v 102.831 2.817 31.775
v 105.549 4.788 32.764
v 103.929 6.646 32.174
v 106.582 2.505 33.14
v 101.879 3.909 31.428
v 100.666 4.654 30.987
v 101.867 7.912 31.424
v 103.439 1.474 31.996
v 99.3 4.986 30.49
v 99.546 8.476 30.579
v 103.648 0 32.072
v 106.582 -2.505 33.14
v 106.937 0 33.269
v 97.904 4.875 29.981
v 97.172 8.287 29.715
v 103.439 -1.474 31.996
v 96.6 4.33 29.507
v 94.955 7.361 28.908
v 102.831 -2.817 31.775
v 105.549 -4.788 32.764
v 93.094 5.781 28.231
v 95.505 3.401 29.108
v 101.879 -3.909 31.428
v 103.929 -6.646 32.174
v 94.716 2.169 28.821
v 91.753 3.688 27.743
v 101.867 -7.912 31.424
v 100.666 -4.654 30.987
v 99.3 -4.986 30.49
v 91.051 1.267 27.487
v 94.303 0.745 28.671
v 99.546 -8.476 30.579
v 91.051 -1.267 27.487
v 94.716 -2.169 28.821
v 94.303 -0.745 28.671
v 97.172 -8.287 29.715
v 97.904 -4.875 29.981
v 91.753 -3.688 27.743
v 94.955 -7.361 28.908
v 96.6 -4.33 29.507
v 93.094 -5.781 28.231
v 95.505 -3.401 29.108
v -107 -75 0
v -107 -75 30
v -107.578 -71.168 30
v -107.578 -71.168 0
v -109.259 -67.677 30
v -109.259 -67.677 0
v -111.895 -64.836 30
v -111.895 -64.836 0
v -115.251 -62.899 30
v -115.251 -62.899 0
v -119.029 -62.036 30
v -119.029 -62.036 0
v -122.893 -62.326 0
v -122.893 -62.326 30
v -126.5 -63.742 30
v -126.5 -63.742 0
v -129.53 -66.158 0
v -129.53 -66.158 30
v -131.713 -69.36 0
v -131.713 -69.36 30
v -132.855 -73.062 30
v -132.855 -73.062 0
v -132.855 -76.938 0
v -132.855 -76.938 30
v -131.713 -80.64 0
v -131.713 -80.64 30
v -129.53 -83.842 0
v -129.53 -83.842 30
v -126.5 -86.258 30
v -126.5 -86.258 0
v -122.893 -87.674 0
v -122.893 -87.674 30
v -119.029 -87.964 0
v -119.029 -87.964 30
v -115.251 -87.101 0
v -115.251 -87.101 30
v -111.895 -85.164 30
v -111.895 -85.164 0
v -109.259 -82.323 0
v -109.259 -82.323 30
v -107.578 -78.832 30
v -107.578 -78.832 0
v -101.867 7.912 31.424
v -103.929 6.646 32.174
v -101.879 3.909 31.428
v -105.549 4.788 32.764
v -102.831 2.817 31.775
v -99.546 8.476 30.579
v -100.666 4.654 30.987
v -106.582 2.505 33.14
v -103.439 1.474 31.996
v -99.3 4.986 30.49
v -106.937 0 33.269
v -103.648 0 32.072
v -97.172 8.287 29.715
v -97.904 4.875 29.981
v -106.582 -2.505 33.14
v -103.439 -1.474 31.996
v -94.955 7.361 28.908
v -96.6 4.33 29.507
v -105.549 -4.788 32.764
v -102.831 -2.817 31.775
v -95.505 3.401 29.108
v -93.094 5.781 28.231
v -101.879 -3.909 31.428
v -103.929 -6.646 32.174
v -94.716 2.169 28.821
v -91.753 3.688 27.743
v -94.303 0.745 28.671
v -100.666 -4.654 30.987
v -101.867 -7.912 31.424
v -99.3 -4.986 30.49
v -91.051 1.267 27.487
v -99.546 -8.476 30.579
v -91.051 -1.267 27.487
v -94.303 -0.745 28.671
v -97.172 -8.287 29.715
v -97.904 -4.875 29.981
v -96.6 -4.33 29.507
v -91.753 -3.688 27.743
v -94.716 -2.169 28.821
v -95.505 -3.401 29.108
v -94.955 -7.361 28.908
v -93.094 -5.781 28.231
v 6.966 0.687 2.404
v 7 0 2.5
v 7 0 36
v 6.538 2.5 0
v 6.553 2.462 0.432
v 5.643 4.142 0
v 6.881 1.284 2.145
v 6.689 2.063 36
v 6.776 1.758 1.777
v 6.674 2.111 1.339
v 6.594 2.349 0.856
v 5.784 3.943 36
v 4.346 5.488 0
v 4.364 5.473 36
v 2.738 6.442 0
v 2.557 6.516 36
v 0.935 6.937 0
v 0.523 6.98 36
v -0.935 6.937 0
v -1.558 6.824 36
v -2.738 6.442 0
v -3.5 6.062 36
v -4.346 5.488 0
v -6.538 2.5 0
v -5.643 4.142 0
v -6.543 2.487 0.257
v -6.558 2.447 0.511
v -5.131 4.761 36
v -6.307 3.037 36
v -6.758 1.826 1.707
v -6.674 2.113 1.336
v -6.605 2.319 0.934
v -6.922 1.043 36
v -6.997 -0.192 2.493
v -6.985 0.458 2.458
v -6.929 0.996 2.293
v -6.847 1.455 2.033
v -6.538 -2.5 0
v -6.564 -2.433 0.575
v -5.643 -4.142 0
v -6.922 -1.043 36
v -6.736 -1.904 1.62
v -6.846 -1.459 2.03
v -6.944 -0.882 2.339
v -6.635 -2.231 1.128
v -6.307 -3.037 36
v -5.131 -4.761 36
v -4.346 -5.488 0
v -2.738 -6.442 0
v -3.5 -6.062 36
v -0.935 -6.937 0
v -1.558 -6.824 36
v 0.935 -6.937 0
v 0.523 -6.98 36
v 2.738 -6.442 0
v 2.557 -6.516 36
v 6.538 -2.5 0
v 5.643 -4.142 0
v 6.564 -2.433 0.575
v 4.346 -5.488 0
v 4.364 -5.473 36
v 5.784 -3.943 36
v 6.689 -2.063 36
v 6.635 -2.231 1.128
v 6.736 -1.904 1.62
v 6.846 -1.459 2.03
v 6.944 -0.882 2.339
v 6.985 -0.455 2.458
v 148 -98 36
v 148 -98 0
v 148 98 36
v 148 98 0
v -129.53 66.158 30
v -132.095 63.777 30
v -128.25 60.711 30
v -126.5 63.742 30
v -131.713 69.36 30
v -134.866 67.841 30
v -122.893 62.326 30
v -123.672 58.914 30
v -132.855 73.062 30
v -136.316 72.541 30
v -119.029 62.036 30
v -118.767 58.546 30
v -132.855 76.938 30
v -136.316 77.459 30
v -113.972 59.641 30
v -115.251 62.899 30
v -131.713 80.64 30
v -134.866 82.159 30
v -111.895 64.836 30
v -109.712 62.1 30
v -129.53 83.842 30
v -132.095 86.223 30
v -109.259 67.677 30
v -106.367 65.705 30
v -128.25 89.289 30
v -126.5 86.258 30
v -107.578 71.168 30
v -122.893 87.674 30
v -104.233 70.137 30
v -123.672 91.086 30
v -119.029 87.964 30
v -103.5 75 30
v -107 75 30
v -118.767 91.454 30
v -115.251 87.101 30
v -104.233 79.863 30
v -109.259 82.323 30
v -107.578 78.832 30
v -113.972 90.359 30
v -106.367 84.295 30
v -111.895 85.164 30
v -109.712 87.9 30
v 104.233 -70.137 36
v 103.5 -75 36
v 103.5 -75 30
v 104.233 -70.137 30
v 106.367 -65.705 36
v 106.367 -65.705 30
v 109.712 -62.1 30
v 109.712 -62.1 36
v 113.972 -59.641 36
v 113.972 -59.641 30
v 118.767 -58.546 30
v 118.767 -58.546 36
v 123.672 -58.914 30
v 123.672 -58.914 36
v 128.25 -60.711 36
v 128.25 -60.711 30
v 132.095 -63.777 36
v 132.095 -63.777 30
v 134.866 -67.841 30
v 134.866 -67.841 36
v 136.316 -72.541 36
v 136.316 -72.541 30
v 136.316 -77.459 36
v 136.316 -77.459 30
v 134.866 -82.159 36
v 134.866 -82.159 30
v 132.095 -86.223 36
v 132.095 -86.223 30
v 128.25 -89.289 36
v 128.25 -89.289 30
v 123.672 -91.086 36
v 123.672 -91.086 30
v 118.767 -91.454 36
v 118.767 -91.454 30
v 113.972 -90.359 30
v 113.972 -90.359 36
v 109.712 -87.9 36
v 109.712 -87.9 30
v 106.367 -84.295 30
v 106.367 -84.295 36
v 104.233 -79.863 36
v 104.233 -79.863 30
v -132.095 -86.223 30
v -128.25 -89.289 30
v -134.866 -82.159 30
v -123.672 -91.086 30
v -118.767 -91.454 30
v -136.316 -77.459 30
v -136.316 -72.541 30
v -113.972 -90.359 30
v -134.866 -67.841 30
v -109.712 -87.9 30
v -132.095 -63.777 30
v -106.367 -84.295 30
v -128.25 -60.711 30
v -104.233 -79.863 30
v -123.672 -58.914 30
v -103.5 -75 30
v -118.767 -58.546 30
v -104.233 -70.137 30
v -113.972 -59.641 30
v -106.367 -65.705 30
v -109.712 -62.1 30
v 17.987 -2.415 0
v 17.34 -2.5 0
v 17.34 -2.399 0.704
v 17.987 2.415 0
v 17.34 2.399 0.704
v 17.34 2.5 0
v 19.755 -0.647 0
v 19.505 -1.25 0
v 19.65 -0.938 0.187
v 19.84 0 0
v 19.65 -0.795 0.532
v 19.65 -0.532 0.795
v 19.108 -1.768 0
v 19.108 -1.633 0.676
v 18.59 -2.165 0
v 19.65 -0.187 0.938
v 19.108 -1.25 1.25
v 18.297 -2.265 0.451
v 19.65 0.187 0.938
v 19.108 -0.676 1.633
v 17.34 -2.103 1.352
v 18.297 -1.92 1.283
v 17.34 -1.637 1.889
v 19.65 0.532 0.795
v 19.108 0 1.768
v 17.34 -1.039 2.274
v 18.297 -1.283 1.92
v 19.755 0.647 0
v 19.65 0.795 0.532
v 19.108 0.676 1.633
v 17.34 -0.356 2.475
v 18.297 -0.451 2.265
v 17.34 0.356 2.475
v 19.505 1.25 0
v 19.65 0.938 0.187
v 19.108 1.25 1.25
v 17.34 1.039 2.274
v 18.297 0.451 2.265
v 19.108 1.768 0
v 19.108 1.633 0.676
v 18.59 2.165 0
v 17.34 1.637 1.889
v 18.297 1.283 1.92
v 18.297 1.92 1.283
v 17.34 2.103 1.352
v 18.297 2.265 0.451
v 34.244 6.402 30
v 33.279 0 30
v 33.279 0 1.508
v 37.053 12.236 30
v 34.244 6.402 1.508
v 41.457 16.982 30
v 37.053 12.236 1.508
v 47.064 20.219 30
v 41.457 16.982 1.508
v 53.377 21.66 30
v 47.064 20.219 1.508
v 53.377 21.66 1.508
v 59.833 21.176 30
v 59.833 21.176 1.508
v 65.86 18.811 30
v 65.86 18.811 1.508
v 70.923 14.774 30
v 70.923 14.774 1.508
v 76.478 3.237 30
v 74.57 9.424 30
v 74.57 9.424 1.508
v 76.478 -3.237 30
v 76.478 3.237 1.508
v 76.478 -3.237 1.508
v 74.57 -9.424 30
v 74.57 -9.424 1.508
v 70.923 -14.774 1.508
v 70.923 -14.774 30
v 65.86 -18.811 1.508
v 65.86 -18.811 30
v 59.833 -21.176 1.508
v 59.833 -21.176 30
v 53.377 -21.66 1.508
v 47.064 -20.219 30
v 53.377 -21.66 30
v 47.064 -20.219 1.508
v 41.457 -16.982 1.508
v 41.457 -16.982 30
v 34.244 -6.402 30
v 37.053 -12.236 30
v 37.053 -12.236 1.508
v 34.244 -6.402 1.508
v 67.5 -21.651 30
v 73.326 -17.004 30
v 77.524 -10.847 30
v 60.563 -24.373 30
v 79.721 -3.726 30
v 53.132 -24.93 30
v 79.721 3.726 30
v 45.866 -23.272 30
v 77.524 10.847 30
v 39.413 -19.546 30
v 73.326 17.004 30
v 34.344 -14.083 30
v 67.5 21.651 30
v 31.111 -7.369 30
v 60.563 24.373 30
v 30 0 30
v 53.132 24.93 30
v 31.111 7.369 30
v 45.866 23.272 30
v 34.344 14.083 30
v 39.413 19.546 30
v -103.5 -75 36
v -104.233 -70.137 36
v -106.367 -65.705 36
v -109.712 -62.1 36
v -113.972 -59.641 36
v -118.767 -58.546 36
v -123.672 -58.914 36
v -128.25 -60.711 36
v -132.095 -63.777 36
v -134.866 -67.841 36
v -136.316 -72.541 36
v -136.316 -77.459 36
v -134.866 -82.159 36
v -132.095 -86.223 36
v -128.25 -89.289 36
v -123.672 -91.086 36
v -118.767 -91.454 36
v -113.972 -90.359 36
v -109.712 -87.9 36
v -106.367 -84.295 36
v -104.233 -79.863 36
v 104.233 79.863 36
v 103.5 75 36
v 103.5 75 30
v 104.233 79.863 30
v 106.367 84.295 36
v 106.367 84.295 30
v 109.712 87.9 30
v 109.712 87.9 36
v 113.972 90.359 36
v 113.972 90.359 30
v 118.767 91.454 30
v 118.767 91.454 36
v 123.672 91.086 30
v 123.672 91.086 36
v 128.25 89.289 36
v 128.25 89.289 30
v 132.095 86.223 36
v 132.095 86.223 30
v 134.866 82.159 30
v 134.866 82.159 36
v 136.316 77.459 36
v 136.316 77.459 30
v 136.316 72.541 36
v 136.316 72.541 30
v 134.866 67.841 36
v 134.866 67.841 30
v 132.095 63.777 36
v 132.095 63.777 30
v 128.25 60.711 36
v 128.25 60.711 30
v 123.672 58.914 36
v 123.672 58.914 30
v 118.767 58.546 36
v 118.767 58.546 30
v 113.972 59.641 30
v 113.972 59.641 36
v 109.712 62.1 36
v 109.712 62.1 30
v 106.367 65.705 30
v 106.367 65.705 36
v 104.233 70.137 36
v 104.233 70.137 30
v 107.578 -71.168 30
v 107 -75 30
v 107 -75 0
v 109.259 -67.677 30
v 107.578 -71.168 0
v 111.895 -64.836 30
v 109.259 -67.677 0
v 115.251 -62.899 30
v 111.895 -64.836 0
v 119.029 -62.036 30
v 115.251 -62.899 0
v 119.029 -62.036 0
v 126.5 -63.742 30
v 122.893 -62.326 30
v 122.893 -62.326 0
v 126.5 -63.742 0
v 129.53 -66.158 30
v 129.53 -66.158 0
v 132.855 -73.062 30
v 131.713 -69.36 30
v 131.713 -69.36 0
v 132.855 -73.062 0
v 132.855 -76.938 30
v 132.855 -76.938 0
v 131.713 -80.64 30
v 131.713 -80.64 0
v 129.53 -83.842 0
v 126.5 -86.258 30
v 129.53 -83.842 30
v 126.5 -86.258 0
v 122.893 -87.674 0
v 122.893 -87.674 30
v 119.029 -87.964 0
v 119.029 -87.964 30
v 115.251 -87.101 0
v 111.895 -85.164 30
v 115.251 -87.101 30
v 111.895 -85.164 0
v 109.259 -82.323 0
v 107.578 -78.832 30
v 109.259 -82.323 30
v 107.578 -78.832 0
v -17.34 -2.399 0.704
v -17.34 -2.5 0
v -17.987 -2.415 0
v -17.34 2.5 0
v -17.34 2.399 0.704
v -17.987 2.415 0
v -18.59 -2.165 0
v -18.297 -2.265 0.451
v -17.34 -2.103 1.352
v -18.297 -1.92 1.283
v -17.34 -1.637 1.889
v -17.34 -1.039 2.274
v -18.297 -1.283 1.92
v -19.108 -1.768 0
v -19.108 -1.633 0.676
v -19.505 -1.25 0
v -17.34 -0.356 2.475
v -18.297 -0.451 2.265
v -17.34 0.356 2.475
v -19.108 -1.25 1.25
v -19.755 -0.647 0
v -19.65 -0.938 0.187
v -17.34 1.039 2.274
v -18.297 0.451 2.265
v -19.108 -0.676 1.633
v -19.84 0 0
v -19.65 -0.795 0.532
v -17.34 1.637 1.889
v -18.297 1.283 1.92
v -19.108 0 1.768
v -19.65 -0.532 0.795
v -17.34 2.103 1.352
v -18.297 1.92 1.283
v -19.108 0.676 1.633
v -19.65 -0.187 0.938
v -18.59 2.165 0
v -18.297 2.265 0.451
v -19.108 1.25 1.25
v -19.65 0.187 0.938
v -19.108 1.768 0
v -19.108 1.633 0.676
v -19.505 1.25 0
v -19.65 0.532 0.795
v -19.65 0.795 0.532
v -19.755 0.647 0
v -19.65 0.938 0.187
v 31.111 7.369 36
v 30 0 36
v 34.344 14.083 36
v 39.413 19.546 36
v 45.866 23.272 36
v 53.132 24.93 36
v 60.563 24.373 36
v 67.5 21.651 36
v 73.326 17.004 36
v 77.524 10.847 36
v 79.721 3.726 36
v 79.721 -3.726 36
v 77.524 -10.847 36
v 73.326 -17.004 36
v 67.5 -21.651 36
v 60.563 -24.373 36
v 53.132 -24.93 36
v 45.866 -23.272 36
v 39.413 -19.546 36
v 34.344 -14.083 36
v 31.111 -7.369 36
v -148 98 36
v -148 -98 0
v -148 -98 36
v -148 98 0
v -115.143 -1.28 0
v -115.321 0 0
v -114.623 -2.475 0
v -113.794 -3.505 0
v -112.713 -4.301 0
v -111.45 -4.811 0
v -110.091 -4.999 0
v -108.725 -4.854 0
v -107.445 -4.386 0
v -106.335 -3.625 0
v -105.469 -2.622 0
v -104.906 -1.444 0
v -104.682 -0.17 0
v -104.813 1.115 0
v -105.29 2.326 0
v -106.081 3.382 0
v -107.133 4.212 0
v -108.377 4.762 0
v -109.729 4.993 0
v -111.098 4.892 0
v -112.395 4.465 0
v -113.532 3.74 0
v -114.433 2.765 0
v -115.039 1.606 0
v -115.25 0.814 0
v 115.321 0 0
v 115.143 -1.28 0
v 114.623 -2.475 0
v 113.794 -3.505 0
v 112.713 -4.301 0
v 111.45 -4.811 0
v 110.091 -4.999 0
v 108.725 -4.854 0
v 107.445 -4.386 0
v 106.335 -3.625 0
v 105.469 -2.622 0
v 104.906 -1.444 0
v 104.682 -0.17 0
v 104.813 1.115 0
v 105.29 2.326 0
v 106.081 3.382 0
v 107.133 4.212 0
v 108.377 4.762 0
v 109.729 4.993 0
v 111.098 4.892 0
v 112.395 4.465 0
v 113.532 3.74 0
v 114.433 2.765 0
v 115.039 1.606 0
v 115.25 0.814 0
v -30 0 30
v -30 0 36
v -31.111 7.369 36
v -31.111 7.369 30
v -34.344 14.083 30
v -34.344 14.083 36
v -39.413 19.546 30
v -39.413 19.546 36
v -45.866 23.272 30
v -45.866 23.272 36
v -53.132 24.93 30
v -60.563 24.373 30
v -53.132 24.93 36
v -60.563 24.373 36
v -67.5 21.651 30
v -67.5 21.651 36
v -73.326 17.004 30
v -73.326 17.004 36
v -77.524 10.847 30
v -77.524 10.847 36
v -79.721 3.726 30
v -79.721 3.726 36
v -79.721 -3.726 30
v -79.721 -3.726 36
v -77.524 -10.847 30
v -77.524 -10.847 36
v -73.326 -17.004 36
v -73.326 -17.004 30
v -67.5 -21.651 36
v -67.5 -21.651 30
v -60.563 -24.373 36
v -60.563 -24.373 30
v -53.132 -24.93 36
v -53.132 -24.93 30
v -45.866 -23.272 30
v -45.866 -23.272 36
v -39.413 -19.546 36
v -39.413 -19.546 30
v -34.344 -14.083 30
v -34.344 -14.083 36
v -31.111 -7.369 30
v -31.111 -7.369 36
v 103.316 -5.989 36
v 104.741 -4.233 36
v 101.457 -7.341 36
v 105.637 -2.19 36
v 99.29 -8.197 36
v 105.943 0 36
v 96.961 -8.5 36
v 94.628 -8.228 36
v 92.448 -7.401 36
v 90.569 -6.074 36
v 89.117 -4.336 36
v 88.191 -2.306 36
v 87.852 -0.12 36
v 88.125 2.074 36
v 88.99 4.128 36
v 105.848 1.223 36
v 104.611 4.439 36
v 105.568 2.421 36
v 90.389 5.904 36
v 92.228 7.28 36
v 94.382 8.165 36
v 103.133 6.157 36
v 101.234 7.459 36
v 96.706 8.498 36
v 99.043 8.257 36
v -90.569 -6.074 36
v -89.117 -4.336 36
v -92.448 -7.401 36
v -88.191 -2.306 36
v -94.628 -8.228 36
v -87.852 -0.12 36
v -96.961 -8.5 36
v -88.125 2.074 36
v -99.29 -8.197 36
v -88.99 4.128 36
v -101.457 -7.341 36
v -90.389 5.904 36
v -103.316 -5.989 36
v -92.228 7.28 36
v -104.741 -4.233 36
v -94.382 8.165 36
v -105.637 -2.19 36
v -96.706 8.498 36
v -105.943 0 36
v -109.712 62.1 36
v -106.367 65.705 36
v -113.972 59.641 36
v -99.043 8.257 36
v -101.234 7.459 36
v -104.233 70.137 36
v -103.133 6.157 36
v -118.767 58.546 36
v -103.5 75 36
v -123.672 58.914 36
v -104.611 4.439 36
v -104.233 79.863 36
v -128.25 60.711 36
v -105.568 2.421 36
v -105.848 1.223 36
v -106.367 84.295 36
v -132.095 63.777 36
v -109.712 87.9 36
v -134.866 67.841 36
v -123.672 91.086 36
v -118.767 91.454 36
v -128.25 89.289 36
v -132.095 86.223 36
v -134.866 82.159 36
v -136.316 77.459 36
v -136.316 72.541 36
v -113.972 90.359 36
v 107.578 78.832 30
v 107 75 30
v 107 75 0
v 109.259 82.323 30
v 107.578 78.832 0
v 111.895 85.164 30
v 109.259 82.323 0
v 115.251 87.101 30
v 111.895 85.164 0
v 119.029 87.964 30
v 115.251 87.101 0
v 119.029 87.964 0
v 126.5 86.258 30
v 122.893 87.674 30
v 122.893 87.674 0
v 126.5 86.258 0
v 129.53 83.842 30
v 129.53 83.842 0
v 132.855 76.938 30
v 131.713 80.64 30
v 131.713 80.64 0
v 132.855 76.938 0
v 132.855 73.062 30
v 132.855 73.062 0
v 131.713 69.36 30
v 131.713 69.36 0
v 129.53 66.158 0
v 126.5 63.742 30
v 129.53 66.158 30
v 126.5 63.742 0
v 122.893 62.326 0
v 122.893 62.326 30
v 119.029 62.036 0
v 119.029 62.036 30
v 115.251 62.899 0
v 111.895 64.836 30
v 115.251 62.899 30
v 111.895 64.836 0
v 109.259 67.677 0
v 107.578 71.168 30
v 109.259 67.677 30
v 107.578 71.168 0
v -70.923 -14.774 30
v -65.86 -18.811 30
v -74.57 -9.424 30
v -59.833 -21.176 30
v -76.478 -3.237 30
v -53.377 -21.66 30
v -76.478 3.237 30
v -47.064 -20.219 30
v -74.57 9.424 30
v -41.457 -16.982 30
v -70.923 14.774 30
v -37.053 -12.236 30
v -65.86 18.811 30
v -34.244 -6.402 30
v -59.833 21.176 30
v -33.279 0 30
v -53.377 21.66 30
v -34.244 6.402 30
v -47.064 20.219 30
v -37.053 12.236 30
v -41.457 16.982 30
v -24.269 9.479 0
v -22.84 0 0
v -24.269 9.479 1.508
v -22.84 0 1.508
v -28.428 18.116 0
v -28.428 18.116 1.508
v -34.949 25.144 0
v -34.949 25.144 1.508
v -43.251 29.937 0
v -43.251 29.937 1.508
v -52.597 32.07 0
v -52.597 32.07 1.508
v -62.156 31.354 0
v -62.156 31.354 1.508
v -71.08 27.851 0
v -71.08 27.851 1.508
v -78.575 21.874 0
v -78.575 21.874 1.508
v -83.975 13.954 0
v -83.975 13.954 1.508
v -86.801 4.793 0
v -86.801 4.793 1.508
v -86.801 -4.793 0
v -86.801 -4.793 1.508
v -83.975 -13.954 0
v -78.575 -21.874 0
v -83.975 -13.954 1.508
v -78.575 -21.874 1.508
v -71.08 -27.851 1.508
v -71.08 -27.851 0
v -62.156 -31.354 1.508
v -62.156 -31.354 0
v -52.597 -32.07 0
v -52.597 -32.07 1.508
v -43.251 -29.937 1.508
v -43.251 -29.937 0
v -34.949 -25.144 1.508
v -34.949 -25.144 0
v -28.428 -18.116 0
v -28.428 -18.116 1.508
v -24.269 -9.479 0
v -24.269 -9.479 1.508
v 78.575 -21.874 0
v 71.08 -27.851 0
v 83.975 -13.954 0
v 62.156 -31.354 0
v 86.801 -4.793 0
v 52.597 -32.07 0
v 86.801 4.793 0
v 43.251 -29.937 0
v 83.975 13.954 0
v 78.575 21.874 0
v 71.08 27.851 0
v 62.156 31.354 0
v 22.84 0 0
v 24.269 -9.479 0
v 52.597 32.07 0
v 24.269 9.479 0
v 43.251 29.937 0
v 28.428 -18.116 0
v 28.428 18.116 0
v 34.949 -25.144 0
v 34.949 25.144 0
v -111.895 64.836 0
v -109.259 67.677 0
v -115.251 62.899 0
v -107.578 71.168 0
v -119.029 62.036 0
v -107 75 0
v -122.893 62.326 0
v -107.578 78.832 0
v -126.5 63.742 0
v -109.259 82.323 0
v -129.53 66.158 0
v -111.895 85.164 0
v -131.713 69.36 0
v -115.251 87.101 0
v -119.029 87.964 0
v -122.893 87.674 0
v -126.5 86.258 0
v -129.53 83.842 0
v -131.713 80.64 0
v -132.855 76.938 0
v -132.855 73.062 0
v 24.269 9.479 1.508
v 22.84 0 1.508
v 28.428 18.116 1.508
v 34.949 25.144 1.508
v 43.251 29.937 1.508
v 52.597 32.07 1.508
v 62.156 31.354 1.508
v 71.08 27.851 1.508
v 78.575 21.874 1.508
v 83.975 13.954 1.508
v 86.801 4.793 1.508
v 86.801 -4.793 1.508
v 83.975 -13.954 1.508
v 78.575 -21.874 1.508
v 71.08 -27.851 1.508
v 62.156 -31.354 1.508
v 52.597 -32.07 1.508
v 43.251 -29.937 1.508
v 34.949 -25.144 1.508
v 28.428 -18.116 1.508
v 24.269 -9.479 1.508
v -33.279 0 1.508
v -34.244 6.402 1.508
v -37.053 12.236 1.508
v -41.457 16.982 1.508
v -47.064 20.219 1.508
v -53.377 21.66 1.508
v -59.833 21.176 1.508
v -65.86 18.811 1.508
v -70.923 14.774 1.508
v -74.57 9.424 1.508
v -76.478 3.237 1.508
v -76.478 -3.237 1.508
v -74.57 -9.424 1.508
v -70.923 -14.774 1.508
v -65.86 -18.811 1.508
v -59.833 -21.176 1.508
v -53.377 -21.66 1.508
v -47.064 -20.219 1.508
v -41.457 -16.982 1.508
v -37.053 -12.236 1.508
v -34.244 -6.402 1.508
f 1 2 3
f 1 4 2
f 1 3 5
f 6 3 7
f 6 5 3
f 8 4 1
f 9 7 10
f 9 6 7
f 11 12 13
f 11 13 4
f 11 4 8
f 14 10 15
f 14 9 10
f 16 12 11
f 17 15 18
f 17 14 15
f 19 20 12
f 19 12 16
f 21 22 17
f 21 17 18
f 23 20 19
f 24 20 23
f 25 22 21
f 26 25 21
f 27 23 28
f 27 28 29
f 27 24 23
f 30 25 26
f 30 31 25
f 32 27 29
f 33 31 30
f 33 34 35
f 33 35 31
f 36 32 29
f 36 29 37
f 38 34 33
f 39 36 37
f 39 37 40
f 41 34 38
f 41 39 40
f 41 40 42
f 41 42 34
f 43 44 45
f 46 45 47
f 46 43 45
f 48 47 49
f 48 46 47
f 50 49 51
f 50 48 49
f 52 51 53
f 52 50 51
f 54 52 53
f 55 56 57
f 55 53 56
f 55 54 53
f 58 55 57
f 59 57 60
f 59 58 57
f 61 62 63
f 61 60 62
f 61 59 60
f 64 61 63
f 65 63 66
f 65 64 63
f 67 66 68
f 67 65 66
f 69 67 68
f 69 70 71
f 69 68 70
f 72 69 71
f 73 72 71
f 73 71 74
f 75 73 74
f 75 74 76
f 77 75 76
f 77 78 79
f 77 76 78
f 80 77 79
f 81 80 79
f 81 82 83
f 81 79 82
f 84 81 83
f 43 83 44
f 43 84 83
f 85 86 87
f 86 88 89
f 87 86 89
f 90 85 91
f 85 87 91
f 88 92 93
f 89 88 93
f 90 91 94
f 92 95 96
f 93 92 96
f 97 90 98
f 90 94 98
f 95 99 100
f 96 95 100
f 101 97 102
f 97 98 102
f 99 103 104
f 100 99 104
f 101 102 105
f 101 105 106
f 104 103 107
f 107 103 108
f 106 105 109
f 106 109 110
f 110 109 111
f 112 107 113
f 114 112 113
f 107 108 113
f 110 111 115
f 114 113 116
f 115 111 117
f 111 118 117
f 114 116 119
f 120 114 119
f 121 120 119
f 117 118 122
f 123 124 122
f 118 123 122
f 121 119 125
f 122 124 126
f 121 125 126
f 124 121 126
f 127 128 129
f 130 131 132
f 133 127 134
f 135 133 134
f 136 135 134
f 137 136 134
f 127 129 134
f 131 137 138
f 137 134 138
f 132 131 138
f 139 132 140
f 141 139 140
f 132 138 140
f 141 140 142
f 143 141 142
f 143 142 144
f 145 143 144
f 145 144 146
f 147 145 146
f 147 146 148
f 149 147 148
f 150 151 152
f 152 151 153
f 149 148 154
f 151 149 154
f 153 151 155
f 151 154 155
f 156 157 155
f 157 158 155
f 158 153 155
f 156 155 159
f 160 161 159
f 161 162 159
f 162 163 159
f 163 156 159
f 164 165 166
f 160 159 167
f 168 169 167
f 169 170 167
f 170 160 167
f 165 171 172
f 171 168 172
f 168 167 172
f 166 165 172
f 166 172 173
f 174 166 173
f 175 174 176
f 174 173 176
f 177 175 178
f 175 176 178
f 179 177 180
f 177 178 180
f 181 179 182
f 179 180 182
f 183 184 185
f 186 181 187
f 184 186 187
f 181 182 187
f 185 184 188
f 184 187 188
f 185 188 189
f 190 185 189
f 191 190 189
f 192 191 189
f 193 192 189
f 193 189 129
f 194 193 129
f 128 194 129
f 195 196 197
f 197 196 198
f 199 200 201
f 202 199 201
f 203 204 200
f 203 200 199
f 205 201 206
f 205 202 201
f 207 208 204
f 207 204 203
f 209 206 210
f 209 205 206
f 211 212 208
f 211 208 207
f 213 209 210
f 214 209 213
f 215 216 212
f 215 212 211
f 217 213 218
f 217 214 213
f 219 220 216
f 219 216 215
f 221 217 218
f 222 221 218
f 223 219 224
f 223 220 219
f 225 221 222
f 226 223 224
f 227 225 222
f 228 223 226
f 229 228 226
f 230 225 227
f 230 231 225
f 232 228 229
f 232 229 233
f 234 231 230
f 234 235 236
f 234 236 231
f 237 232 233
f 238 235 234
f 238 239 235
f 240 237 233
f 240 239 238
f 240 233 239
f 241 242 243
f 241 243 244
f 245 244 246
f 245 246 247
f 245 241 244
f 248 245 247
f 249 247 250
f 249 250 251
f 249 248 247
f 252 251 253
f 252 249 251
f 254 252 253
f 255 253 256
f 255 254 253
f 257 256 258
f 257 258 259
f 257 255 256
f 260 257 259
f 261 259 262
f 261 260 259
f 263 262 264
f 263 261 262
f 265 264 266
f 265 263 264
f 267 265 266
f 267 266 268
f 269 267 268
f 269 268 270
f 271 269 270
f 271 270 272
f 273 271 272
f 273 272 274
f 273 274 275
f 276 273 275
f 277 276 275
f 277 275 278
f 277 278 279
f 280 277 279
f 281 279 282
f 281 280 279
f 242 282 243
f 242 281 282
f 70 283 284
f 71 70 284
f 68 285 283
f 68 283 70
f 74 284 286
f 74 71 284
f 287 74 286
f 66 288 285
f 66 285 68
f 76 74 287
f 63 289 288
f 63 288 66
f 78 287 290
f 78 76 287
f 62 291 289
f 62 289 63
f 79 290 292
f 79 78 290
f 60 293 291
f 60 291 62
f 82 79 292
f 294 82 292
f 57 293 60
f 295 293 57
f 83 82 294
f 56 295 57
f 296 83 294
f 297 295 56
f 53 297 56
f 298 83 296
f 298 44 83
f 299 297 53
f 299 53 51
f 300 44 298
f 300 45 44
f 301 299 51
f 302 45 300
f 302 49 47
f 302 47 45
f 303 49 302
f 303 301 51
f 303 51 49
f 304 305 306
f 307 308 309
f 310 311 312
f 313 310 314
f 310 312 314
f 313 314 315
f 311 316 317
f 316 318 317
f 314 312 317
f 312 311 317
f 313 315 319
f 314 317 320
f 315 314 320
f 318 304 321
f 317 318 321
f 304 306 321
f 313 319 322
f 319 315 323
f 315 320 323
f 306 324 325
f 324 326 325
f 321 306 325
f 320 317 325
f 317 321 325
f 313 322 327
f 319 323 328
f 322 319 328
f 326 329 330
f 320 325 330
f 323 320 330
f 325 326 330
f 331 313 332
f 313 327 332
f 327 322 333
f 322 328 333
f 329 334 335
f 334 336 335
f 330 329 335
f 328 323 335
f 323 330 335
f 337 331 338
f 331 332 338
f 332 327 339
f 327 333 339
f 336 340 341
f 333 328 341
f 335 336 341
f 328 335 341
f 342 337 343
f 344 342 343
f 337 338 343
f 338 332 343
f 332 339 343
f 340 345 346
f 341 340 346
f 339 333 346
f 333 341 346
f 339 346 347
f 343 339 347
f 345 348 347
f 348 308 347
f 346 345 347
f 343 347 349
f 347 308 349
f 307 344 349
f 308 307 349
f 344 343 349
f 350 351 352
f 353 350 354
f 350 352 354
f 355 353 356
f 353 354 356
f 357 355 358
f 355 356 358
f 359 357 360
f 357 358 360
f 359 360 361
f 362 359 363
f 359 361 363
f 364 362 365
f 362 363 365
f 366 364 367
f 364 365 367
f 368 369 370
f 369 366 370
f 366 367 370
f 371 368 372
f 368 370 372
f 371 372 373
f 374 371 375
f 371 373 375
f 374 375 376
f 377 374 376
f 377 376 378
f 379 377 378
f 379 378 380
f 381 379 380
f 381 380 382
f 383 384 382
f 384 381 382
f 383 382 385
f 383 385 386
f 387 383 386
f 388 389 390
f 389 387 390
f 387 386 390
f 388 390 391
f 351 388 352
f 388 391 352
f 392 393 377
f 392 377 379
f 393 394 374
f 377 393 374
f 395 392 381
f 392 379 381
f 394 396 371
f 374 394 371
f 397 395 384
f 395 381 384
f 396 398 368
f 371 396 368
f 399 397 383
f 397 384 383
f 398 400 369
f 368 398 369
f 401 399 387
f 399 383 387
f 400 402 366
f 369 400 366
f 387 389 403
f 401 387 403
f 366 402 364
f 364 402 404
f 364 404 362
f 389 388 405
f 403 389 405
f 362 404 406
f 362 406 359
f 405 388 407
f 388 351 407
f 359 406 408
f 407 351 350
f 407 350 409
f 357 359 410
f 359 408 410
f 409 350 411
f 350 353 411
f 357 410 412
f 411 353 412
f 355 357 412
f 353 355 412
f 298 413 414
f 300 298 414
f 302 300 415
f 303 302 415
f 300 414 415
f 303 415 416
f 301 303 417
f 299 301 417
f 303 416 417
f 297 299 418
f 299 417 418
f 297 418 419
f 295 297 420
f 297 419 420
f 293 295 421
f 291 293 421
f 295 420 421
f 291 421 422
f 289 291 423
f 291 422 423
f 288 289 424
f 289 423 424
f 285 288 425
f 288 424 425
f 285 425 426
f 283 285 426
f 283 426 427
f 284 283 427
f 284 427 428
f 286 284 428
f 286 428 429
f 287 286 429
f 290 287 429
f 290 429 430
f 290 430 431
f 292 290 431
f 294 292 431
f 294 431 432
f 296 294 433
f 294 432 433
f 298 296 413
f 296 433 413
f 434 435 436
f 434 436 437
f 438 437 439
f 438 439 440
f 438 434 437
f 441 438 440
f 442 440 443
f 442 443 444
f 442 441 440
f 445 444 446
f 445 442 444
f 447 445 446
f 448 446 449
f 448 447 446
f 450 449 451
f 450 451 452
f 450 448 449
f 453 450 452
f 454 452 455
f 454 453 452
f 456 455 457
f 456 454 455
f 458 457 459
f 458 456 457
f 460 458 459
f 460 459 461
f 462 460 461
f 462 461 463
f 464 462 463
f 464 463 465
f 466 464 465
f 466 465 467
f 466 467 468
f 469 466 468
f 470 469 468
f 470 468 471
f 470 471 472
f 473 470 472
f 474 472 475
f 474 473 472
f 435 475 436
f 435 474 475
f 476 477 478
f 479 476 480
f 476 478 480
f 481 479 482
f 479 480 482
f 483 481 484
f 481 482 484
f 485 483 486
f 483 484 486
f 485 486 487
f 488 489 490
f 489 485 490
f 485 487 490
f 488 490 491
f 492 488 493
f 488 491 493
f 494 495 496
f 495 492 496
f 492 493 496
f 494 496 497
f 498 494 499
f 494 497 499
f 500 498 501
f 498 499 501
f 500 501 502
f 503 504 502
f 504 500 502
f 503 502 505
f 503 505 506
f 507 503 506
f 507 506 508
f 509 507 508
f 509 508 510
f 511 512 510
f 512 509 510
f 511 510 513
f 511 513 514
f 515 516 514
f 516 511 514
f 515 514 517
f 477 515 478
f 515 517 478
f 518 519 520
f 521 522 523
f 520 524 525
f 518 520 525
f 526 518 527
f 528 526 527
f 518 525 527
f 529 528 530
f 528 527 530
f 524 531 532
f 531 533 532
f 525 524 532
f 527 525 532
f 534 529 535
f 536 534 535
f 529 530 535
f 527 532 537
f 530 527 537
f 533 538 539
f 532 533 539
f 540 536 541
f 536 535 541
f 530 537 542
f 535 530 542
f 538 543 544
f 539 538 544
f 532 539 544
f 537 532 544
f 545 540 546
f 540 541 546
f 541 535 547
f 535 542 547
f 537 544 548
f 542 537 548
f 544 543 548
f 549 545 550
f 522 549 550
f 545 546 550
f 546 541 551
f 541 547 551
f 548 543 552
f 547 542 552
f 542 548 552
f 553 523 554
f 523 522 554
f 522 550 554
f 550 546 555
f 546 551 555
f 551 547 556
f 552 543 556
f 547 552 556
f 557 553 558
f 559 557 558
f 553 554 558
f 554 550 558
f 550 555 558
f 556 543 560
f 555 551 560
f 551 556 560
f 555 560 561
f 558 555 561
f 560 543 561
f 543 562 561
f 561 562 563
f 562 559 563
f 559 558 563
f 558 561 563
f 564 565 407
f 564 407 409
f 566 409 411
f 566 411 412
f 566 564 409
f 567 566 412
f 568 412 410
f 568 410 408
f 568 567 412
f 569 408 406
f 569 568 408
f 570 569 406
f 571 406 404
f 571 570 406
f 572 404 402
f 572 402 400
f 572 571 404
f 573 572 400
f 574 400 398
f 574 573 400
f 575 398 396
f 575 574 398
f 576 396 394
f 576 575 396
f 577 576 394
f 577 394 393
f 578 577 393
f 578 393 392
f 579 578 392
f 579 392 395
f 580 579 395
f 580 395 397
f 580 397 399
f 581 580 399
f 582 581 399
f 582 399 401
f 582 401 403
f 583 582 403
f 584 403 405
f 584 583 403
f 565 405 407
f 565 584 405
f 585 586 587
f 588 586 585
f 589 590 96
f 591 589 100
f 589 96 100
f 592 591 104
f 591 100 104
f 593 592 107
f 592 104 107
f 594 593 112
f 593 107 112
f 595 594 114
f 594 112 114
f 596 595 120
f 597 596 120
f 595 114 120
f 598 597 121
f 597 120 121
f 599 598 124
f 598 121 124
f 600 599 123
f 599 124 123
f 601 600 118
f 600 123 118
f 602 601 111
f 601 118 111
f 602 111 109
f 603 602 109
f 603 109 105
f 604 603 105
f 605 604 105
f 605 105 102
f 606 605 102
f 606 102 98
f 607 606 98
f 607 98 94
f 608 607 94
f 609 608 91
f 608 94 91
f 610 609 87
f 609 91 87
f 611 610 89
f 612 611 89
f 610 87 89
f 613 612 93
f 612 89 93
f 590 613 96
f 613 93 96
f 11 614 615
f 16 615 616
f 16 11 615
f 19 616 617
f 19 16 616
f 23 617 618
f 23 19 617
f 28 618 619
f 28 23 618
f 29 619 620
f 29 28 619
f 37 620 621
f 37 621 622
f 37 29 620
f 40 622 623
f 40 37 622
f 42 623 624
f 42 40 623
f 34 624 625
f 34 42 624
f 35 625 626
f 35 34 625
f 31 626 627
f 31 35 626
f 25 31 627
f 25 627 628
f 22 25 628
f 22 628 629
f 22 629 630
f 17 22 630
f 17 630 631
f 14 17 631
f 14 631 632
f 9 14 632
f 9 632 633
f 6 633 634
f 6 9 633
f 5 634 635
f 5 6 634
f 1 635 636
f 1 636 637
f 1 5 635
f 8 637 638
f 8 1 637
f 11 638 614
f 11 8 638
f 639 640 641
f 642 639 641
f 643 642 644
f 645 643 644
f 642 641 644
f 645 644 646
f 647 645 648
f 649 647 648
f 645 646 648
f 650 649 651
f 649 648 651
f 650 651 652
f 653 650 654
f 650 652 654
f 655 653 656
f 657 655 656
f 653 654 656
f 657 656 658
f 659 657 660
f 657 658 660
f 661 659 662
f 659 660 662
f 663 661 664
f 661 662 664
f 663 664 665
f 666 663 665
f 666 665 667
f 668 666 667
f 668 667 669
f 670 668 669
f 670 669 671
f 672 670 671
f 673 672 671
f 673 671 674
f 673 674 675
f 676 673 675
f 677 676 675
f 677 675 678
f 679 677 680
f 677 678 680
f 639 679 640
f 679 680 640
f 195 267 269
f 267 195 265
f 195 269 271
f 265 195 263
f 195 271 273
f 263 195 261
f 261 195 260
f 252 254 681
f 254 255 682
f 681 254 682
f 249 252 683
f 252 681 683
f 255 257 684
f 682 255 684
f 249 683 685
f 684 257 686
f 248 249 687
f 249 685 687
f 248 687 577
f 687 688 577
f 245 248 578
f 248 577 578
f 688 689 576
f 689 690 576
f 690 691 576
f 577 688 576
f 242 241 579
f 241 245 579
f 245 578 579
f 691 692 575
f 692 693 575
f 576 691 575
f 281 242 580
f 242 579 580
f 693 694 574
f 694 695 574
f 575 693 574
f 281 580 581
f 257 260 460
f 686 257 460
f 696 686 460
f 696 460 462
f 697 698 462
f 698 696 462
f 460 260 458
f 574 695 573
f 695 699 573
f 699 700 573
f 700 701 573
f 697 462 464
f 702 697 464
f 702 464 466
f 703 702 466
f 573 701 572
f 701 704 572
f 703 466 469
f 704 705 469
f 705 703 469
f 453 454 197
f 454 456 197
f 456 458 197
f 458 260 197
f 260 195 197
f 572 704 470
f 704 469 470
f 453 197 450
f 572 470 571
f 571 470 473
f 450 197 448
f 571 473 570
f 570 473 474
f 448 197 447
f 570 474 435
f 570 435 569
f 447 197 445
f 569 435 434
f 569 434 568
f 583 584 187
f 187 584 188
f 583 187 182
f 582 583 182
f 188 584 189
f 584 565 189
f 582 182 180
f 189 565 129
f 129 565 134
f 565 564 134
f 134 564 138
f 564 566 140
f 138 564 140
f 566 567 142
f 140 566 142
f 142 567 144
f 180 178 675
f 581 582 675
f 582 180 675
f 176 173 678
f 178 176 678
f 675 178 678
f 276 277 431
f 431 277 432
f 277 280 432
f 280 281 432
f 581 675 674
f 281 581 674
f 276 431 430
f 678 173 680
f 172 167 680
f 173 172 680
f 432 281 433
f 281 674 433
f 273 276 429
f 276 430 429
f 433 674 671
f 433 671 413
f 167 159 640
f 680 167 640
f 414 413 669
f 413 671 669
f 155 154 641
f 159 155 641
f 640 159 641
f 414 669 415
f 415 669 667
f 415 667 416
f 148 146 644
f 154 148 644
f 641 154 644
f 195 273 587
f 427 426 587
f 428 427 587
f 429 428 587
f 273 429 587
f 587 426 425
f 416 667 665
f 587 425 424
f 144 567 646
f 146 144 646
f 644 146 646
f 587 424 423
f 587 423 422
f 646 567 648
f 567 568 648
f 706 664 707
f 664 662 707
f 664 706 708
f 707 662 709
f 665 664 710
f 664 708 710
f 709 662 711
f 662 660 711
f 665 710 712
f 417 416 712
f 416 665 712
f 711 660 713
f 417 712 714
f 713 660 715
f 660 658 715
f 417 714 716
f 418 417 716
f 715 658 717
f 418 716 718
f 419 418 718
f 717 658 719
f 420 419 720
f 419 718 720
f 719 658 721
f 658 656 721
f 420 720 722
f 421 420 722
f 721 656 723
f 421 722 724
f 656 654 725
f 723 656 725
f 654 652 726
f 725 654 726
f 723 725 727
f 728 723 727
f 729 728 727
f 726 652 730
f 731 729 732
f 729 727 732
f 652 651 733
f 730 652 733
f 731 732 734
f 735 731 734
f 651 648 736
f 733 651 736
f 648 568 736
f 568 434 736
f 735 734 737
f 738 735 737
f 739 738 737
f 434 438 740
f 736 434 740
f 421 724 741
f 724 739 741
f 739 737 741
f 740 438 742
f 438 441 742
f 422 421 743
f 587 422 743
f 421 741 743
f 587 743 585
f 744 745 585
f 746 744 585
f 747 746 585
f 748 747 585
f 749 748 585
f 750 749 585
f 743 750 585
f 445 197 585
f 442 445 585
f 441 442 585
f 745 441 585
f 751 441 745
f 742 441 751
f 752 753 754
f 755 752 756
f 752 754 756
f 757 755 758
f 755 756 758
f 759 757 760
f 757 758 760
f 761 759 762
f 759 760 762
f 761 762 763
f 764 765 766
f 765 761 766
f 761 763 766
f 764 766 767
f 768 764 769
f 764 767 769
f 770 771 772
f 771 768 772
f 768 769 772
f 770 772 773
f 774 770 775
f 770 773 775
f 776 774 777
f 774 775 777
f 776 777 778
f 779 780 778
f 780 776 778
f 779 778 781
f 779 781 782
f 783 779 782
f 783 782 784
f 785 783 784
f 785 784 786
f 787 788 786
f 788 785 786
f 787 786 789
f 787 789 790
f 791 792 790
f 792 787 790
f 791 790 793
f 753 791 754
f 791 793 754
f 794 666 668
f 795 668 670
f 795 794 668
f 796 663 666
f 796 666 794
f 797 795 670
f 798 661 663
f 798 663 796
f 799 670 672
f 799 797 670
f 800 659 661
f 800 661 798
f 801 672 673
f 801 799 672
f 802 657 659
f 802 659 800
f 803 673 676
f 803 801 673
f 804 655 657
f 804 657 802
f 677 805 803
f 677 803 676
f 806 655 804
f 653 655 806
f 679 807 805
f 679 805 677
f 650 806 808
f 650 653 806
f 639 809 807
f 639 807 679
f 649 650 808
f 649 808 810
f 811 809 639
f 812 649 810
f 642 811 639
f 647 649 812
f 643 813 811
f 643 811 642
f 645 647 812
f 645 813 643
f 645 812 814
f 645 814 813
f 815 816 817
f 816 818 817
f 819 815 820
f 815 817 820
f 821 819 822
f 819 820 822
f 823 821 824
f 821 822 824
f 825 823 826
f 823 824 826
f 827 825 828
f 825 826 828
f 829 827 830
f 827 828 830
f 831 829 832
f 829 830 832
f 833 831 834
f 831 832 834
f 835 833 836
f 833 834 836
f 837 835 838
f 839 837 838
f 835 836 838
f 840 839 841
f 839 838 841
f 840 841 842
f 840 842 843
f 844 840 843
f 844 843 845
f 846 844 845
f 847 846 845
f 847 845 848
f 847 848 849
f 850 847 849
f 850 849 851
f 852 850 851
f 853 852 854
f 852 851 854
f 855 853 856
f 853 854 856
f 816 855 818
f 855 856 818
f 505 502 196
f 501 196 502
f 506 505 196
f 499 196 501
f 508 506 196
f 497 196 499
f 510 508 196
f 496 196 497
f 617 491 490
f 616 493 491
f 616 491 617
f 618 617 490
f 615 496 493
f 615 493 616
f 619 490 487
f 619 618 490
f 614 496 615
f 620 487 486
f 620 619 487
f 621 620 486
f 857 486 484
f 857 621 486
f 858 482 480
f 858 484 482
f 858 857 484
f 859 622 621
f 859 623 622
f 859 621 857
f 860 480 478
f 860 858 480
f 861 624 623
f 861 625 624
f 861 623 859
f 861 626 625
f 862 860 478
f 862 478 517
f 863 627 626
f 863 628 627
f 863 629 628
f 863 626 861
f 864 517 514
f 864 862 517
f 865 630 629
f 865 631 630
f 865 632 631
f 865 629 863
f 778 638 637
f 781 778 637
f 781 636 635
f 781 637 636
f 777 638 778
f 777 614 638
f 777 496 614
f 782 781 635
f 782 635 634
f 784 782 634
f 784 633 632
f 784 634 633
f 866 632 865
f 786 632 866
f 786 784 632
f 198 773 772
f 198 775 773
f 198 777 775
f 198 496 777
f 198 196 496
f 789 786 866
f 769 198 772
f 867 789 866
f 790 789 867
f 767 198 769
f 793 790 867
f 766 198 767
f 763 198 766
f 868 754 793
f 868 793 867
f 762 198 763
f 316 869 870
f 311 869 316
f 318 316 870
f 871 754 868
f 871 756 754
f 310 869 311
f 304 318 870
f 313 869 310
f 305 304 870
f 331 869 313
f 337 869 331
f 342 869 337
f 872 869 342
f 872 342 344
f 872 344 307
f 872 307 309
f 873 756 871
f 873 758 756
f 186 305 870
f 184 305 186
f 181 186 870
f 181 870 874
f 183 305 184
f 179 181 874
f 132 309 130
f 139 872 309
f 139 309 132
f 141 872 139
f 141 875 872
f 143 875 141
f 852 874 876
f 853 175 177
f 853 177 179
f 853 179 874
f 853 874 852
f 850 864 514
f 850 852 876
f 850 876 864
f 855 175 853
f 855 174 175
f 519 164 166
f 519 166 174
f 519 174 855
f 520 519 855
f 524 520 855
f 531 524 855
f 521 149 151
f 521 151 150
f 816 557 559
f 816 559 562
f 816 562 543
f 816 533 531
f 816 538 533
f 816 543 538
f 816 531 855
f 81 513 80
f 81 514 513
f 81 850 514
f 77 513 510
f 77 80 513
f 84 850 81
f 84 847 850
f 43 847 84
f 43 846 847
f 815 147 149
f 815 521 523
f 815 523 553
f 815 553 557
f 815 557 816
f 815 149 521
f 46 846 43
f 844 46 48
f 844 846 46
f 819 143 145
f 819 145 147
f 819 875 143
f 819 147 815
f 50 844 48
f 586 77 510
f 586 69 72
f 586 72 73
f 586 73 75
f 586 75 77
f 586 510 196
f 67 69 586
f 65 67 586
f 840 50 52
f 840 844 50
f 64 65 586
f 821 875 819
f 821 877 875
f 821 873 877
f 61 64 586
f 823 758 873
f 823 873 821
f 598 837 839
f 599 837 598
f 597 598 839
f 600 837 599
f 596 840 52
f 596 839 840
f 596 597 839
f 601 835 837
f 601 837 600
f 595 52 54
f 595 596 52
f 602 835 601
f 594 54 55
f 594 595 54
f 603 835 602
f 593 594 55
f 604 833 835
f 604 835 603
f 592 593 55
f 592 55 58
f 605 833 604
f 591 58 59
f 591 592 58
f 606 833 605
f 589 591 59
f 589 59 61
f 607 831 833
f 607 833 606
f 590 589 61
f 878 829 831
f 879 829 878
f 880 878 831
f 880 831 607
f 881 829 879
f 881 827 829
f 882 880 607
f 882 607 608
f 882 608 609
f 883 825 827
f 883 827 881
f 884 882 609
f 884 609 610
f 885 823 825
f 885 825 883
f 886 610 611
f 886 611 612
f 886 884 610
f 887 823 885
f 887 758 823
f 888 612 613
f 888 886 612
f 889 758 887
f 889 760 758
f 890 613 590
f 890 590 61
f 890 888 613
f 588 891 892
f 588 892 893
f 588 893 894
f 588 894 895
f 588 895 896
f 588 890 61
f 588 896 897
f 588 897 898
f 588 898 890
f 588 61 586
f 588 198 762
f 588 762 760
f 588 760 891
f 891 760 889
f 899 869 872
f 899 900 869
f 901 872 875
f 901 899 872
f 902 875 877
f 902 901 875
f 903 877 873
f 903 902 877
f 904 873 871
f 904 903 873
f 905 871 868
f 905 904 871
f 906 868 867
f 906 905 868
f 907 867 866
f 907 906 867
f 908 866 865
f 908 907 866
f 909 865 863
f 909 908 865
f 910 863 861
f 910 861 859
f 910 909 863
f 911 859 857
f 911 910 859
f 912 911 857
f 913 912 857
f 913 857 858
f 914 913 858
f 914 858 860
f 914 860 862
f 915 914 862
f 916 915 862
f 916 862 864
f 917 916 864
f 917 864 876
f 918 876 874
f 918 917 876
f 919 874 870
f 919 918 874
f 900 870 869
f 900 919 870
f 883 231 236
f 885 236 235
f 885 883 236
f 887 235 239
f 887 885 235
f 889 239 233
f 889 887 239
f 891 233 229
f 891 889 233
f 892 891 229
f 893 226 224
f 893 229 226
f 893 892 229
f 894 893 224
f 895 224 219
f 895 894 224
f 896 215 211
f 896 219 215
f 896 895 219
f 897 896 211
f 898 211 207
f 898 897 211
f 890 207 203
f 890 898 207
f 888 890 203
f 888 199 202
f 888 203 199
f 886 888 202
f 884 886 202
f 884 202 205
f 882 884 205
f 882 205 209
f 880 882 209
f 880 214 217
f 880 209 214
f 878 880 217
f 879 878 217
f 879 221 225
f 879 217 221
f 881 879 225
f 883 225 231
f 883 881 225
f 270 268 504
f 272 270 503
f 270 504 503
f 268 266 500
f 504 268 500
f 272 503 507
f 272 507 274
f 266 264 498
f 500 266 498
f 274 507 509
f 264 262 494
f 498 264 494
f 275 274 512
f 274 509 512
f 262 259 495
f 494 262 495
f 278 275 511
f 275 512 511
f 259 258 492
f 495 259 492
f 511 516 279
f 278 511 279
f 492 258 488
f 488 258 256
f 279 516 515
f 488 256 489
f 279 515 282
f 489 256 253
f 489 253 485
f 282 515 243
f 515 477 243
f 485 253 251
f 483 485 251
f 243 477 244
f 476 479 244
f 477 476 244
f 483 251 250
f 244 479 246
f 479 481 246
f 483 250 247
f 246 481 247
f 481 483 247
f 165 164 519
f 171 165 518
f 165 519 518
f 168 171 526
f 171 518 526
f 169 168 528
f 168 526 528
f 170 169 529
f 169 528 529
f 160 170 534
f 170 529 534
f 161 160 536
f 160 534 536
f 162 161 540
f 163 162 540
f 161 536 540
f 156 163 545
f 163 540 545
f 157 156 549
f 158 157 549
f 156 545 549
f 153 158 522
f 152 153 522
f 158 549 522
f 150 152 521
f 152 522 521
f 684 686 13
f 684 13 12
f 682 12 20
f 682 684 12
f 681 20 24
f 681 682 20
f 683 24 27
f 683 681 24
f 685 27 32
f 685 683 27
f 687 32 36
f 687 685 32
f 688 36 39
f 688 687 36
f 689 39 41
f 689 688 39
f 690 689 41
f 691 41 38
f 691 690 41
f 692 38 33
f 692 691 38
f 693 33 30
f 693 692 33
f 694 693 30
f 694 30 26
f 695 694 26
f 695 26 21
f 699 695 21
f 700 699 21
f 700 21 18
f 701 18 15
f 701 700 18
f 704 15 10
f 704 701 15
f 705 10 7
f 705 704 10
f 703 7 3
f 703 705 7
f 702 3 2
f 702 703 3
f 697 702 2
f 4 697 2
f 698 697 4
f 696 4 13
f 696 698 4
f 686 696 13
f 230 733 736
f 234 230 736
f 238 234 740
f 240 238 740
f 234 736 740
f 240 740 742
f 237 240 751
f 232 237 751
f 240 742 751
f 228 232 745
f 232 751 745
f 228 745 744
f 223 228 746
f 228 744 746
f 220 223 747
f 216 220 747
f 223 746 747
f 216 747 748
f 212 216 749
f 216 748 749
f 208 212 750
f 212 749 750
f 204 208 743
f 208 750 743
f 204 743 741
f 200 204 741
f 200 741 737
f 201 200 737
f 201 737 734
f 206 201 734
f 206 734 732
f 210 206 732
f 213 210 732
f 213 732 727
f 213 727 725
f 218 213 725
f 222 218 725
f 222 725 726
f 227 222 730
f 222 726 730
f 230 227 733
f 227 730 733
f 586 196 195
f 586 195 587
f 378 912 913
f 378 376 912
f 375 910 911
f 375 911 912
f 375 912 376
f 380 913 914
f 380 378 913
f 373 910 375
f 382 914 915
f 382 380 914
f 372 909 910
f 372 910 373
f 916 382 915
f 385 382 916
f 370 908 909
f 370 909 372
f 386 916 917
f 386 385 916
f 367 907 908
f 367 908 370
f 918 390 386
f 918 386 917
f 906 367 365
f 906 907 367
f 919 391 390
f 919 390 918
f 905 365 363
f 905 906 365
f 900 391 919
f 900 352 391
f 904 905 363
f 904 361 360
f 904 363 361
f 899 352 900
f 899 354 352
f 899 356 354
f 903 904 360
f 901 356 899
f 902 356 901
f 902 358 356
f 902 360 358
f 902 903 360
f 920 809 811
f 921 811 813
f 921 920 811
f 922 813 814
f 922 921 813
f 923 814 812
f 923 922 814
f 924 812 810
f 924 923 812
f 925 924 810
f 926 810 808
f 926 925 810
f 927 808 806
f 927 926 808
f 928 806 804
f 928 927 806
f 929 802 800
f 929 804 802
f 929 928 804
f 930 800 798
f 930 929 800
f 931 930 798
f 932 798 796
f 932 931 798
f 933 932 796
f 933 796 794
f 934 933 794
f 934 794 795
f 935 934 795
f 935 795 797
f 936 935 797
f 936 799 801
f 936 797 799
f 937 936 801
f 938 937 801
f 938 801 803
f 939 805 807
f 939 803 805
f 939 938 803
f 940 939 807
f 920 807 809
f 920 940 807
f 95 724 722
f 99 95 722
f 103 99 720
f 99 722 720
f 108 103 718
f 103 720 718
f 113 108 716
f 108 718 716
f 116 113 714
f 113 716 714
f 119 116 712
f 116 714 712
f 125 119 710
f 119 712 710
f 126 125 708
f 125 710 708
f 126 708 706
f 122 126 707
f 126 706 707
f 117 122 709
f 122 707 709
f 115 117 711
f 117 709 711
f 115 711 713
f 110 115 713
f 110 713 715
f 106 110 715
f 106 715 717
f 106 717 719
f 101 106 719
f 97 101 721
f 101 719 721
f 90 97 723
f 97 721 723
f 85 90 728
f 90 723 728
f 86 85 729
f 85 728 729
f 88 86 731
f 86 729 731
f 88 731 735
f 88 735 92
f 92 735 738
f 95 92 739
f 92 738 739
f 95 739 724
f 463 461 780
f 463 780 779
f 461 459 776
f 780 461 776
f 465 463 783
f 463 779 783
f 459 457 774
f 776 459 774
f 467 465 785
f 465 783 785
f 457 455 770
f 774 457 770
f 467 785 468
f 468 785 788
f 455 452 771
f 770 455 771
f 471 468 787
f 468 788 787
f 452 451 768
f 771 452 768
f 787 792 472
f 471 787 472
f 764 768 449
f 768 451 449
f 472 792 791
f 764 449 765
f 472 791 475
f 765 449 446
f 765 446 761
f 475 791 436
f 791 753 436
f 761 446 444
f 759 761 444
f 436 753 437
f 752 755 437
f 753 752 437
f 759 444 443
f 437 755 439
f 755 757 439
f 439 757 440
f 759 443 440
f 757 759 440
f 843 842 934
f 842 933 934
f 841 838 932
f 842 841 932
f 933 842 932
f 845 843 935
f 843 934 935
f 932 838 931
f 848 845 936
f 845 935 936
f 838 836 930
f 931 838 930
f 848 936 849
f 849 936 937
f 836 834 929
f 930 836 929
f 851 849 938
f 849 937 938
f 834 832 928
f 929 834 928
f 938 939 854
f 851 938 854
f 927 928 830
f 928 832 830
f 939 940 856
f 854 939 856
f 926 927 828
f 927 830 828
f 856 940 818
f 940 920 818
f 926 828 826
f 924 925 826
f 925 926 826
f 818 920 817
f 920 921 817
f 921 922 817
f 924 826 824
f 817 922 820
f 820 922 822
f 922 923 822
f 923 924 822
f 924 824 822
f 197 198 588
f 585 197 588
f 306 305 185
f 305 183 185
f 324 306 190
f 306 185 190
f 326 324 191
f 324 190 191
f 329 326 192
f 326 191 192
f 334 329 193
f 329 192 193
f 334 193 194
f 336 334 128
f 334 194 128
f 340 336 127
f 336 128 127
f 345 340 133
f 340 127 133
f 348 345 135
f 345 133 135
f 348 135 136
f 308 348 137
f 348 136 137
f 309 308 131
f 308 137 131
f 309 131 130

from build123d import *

# Parameters (mm, degrees)
SKETCH1_W      = 148
SKETCH1_H      = 196
SKETCH1_R      = 13
EXTRUDE1_DEPTH = 36
SKETCH2_R      = 21.720880237
EXTRUDE2_DEPTH = 182.118745579
SKETCH3_R      = 16.5
EXTRUDE3_DEPTH = 6
SKETCH5_R      = 25
EXTRUDE5_DEPTH = 6
SKETCH4_R      = 7
EXTRUDE4_DEPTH = 182.118745579


# Read off the part's stored shape, not the designer's step: Cavity1
with BuildPart() as part:
    # Sketch1 → Extrude1 (new body)
    with BuildSketch(Plane.XY):
        with Locations((-74, 0)):
            Rectangle(SKETCH1_W, SKETCH1_H)
        with Locations((-120, 75)):
            Circle(SKETCH1_R, mode=Mode.SUBTRACT)
        with Locations((-120, -75)):
            Circle(SKETCH1_R, mode=Mode.SUBTRACT)
    extrude(amount=EXTRUDE1_DEPTH)

    # Cavity1 outline → Cavity1 (revolve, cut)
    with BuildSketch(Plane(origin=(-55, 0, 0), x_dir=(1, 0, 0), z_dir=(0, -1, 0))):
        with BuildLine():
            Line((32.16, 1.5075), (21.720880237, 1.5075))
            ThreePointArc((21.720880237, 1.5075), (19.980169175, 1.111079032), (18.582768743, 0))
            Line((18.582768743, 0), (32.16, 0))
            Line((32.16, 0), (32.16, 1.5075))
        make_face()
    revolve(axis=Axis((-55, 0, 0), (0, 0, 1)), mode=Mode.SUBTRACT)

    # Sketch2 → Extrude2 (cut, through all)
    with BuildSketch(Plane.XY):
        with Locations((-55, 0)):
            Circle(SKETCH2_R)
    extrude(amount=EXTRUDE2_DEPTH, mode=Mode.SUBTRACT)

    # Sketch3 → Extrude3 (cut)
    with BuildSketch(Plane.XY.offset(36)):
        with Locations((-120, 75)):
            Circle(SKETCH3_R)
        with Locations((-120, -75)):
            Circle(SKETCH3_R)
    extrude(amount=-EXTRUDE3_DEPTH, mode=Mode.SUBTRACT)

    # Sketch5 → Extrude5 (cut)
    with BuildSketch(Plane.XY.offset(36)):
        with Locations((-55, 0)):
            Circle(SKETCH5_R)
    extrude(amount=-EXTRUDE5_DEPTH, mode=Mode.SUBTRACT)

    # Sketch7 → Cut-Revolve2 (revolve, cut)
    with BuildSketch(Plane(origin=(0, 0, 0), x_dir=(1, 0, 0), z_dir=(0, 1, 0))):
        Polygon((-116.584356678, 3.471349293), (-103.64765553, -32.071944992), (-106.936579703, -33.269015494), (-102.122979844, -46.494272413), (-94.135592567, -43.587101195), (-111.885893574, 5.18145001), align=None)
    revolve(axis=Axis((-116.086721699, 0, -16.723130427), (0.34202014332566283, 0, 0.9396926207859105)), mode=Mode.SUBTRACT)

    # Mirror1: part across plane


with BuildPart() as part_1:
    add(part.part)
    add(part.part.mirror(Plane(origin=(0, 0, 0), x_dir=(0, 0, 1), z_dir=(1, 0, 0))))

    # Sketch4 → Extrude4 (cut, through all)
    with BuildSketch(Plane.XY.offset(36)):
        Circle(SKETCH4_R)
    extrude(amount=-EXTRUDE4_DEPTH, mode=Mode.SUBTRACT)

    # Sketch6 → Cut-Revolve1 (revolve, cut)
    with BuildSketch(Plane(origin=(0, 0, 0), x_dir=(-1, 0, 0), z_dir=(0, 0, -1))):
        with BuildLine():
            Line((-17.34, 2.5), (17.34, 2.5))
            ThreePointArc((17.34, 2.5), (19.107766953, 1.767766953), (19.84, 0))
            Line((19.84, 0), (-19.84, 0))
            ThreePointArc((-19.84, 0), (-19.107766953, 1.767766953), (-17.34, 2.5))
        make_face()
    revolve(axis=Axis((55, 0, 0), (-1, 0, 0)), mode=Mode.SUBTRACT)


solid = part_1.part
